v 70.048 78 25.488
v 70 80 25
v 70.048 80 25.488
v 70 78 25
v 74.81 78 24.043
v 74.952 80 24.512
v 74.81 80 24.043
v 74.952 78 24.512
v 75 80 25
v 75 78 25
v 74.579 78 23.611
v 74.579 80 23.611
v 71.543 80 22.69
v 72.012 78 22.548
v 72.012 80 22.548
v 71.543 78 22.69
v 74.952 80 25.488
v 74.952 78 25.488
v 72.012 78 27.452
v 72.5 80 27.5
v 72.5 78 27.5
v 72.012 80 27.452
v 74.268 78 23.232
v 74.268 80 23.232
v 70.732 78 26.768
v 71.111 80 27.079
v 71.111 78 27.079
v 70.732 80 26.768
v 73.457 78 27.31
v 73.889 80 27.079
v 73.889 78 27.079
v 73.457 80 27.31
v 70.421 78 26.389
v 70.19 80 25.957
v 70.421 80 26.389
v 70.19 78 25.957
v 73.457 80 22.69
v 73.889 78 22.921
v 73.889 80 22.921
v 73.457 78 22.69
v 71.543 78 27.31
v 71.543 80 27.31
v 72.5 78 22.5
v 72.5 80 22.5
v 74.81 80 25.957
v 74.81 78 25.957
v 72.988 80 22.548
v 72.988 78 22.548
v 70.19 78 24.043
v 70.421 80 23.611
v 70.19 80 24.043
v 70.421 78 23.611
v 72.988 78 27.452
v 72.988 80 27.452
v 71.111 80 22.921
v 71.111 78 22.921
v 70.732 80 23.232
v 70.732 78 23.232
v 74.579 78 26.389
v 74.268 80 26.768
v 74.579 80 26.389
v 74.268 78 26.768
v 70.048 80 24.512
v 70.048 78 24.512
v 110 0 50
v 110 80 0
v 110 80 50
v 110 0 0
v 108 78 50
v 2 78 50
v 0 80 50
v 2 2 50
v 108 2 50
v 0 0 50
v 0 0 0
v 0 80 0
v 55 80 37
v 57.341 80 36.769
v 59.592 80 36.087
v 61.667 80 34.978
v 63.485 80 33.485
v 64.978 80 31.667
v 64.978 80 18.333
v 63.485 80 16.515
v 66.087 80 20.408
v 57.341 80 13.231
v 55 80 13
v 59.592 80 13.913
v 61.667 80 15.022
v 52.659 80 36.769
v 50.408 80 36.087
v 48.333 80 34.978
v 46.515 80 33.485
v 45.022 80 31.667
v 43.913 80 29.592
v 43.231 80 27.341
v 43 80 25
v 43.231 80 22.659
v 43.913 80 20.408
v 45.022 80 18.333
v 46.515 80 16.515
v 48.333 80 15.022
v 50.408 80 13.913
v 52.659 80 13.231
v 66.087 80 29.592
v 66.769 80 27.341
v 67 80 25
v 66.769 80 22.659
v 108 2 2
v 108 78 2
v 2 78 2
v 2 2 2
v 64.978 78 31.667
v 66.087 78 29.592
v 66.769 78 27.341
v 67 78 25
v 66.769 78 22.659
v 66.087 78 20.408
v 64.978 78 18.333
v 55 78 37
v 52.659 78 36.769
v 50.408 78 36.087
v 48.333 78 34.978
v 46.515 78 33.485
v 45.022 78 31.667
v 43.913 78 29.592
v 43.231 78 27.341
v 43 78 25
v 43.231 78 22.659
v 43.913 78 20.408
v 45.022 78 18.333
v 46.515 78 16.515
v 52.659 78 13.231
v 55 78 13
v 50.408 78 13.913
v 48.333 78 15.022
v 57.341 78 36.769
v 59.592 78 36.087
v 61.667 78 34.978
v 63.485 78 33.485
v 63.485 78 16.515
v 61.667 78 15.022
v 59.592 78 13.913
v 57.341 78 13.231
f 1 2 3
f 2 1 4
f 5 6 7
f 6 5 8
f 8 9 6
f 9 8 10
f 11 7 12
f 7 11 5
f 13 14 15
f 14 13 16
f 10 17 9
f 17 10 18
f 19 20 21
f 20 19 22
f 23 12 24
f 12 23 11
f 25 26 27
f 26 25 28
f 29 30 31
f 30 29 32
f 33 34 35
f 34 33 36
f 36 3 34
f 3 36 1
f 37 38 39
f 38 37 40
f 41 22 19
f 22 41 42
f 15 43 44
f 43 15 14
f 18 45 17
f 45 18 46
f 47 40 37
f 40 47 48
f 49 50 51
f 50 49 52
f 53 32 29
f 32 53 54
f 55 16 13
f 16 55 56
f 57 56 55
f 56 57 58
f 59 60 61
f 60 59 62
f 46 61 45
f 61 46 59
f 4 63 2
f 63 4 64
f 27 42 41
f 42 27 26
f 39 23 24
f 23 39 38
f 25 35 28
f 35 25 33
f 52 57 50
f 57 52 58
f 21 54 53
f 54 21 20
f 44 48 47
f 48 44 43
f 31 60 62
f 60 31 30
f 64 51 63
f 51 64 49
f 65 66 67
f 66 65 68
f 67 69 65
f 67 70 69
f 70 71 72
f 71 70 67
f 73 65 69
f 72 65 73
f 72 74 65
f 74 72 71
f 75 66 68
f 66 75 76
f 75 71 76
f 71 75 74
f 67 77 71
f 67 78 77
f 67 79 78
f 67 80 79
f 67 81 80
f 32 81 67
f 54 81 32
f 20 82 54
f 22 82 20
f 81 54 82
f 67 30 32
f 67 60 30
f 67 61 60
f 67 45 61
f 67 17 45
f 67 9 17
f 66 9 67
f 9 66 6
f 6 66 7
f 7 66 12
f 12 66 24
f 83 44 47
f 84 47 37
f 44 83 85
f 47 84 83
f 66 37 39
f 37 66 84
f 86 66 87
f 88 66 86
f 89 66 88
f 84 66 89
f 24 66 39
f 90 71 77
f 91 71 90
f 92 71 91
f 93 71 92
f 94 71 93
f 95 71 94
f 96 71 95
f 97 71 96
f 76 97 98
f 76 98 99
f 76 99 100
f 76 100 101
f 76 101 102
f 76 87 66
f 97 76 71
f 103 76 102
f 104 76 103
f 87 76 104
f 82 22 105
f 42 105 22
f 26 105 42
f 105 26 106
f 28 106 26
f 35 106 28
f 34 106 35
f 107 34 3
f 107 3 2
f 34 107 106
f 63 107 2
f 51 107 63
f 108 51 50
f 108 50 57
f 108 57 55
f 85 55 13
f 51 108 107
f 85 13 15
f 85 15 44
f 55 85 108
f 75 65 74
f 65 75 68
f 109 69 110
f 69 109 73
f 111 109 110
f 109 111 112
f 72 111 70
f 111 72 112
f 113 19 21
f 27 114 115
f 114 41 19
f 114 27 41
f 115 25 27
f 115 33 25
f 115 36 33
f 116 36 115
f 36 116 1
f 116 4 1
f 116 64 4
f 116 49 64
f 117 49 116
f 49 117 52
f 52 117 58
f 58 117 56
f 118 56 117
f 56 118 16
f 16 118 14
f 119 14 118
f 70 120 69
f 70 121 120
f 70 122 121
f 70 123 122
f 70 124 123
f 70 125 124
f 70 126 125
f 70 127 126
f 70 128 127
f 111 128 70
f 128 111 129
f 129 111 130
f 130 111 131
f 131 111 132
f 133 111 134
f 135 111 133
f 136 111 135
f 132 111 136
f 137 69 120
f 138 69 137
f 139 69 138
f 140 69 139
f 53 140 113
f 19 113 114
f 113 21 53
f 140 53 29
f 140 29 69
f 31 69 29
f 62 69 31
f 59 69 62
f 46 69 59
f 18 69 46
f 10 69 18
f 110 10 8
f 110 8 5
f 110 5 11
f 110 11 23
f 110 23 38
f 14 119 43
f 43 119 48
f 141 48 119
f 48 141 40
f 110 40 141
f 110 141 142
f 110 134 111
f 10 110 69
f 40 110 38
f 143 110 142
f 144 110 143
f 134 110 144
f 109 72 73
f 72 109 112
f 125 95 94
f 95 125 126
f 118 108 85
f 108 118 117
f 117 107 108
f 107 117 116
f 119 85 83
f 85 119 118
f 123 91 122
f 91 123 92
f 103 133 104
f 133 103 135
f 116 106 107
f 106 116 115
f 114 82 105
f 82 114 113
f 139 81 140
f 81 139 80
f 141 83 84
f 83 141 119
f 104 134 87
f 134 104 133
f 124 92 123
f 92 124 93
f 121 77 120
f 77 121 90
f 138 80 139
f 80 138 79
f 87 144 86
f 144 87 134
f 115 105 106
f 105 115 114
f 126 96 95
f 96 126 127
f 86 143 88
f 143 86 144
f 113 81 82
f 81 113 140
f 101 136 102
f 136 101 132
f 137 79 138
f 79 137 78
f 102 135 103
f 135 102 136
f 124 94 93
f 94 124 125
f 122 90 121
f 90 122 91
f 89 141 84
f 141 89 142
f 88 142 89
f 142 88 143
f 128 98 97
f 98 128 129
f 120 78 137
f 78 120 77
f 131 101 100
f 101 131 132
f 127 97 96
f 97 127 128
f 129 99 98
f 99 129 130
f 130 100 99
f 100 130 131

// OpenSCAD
$fn = 32;

// ----------------------------------------------------------------------
// Vent box: roundvent enclosure
// ----------------------------------------------------------------------

// --- parameters (mm) ---
box_l = 110;              // box length, X
box_w = 80;               // box width, Y
box_h = 50;               // box height, Z
wall_t = 2;               // shell wall thickness
vent_d = 24;              // central vent diameter
ring_d = 5;               // ring hole diameter
n_ring = 8;               // holes in the ring
ring_r = 17.5;            // ring radius
fit_tol = 0.1;            // tolerance for press fits, mm
free_tol = 0.5;           // tolerance for clearance fits, mm

ring_step = 360 / n_ring;  // ring hole angular step

difference() {
  cube([box_l, box_w, box_h]);
  translate([wall_t, wall_t, wall_t])
    cube([box_l - 2 * wall_t, box_w - 2 * wall_t, box_h]);
  translate([box_l / 2, box_w - wall_t - 1, box_h / 2])
    rotate([-90, 0, 0]) cylinder(h = wall_t + 2, d = vent_d);
  for (i = [0 : n_ring - 1])
    translate([box_l / 2, box_w - wall_t - 1, box_h / 2])
      rotate([0, 0, i * ring_step])
        translate([ring_r, 0, 0]) rotate([-90, 0, 0])
          cylinder(h = wall_t + 2, d = ring_d);
}
